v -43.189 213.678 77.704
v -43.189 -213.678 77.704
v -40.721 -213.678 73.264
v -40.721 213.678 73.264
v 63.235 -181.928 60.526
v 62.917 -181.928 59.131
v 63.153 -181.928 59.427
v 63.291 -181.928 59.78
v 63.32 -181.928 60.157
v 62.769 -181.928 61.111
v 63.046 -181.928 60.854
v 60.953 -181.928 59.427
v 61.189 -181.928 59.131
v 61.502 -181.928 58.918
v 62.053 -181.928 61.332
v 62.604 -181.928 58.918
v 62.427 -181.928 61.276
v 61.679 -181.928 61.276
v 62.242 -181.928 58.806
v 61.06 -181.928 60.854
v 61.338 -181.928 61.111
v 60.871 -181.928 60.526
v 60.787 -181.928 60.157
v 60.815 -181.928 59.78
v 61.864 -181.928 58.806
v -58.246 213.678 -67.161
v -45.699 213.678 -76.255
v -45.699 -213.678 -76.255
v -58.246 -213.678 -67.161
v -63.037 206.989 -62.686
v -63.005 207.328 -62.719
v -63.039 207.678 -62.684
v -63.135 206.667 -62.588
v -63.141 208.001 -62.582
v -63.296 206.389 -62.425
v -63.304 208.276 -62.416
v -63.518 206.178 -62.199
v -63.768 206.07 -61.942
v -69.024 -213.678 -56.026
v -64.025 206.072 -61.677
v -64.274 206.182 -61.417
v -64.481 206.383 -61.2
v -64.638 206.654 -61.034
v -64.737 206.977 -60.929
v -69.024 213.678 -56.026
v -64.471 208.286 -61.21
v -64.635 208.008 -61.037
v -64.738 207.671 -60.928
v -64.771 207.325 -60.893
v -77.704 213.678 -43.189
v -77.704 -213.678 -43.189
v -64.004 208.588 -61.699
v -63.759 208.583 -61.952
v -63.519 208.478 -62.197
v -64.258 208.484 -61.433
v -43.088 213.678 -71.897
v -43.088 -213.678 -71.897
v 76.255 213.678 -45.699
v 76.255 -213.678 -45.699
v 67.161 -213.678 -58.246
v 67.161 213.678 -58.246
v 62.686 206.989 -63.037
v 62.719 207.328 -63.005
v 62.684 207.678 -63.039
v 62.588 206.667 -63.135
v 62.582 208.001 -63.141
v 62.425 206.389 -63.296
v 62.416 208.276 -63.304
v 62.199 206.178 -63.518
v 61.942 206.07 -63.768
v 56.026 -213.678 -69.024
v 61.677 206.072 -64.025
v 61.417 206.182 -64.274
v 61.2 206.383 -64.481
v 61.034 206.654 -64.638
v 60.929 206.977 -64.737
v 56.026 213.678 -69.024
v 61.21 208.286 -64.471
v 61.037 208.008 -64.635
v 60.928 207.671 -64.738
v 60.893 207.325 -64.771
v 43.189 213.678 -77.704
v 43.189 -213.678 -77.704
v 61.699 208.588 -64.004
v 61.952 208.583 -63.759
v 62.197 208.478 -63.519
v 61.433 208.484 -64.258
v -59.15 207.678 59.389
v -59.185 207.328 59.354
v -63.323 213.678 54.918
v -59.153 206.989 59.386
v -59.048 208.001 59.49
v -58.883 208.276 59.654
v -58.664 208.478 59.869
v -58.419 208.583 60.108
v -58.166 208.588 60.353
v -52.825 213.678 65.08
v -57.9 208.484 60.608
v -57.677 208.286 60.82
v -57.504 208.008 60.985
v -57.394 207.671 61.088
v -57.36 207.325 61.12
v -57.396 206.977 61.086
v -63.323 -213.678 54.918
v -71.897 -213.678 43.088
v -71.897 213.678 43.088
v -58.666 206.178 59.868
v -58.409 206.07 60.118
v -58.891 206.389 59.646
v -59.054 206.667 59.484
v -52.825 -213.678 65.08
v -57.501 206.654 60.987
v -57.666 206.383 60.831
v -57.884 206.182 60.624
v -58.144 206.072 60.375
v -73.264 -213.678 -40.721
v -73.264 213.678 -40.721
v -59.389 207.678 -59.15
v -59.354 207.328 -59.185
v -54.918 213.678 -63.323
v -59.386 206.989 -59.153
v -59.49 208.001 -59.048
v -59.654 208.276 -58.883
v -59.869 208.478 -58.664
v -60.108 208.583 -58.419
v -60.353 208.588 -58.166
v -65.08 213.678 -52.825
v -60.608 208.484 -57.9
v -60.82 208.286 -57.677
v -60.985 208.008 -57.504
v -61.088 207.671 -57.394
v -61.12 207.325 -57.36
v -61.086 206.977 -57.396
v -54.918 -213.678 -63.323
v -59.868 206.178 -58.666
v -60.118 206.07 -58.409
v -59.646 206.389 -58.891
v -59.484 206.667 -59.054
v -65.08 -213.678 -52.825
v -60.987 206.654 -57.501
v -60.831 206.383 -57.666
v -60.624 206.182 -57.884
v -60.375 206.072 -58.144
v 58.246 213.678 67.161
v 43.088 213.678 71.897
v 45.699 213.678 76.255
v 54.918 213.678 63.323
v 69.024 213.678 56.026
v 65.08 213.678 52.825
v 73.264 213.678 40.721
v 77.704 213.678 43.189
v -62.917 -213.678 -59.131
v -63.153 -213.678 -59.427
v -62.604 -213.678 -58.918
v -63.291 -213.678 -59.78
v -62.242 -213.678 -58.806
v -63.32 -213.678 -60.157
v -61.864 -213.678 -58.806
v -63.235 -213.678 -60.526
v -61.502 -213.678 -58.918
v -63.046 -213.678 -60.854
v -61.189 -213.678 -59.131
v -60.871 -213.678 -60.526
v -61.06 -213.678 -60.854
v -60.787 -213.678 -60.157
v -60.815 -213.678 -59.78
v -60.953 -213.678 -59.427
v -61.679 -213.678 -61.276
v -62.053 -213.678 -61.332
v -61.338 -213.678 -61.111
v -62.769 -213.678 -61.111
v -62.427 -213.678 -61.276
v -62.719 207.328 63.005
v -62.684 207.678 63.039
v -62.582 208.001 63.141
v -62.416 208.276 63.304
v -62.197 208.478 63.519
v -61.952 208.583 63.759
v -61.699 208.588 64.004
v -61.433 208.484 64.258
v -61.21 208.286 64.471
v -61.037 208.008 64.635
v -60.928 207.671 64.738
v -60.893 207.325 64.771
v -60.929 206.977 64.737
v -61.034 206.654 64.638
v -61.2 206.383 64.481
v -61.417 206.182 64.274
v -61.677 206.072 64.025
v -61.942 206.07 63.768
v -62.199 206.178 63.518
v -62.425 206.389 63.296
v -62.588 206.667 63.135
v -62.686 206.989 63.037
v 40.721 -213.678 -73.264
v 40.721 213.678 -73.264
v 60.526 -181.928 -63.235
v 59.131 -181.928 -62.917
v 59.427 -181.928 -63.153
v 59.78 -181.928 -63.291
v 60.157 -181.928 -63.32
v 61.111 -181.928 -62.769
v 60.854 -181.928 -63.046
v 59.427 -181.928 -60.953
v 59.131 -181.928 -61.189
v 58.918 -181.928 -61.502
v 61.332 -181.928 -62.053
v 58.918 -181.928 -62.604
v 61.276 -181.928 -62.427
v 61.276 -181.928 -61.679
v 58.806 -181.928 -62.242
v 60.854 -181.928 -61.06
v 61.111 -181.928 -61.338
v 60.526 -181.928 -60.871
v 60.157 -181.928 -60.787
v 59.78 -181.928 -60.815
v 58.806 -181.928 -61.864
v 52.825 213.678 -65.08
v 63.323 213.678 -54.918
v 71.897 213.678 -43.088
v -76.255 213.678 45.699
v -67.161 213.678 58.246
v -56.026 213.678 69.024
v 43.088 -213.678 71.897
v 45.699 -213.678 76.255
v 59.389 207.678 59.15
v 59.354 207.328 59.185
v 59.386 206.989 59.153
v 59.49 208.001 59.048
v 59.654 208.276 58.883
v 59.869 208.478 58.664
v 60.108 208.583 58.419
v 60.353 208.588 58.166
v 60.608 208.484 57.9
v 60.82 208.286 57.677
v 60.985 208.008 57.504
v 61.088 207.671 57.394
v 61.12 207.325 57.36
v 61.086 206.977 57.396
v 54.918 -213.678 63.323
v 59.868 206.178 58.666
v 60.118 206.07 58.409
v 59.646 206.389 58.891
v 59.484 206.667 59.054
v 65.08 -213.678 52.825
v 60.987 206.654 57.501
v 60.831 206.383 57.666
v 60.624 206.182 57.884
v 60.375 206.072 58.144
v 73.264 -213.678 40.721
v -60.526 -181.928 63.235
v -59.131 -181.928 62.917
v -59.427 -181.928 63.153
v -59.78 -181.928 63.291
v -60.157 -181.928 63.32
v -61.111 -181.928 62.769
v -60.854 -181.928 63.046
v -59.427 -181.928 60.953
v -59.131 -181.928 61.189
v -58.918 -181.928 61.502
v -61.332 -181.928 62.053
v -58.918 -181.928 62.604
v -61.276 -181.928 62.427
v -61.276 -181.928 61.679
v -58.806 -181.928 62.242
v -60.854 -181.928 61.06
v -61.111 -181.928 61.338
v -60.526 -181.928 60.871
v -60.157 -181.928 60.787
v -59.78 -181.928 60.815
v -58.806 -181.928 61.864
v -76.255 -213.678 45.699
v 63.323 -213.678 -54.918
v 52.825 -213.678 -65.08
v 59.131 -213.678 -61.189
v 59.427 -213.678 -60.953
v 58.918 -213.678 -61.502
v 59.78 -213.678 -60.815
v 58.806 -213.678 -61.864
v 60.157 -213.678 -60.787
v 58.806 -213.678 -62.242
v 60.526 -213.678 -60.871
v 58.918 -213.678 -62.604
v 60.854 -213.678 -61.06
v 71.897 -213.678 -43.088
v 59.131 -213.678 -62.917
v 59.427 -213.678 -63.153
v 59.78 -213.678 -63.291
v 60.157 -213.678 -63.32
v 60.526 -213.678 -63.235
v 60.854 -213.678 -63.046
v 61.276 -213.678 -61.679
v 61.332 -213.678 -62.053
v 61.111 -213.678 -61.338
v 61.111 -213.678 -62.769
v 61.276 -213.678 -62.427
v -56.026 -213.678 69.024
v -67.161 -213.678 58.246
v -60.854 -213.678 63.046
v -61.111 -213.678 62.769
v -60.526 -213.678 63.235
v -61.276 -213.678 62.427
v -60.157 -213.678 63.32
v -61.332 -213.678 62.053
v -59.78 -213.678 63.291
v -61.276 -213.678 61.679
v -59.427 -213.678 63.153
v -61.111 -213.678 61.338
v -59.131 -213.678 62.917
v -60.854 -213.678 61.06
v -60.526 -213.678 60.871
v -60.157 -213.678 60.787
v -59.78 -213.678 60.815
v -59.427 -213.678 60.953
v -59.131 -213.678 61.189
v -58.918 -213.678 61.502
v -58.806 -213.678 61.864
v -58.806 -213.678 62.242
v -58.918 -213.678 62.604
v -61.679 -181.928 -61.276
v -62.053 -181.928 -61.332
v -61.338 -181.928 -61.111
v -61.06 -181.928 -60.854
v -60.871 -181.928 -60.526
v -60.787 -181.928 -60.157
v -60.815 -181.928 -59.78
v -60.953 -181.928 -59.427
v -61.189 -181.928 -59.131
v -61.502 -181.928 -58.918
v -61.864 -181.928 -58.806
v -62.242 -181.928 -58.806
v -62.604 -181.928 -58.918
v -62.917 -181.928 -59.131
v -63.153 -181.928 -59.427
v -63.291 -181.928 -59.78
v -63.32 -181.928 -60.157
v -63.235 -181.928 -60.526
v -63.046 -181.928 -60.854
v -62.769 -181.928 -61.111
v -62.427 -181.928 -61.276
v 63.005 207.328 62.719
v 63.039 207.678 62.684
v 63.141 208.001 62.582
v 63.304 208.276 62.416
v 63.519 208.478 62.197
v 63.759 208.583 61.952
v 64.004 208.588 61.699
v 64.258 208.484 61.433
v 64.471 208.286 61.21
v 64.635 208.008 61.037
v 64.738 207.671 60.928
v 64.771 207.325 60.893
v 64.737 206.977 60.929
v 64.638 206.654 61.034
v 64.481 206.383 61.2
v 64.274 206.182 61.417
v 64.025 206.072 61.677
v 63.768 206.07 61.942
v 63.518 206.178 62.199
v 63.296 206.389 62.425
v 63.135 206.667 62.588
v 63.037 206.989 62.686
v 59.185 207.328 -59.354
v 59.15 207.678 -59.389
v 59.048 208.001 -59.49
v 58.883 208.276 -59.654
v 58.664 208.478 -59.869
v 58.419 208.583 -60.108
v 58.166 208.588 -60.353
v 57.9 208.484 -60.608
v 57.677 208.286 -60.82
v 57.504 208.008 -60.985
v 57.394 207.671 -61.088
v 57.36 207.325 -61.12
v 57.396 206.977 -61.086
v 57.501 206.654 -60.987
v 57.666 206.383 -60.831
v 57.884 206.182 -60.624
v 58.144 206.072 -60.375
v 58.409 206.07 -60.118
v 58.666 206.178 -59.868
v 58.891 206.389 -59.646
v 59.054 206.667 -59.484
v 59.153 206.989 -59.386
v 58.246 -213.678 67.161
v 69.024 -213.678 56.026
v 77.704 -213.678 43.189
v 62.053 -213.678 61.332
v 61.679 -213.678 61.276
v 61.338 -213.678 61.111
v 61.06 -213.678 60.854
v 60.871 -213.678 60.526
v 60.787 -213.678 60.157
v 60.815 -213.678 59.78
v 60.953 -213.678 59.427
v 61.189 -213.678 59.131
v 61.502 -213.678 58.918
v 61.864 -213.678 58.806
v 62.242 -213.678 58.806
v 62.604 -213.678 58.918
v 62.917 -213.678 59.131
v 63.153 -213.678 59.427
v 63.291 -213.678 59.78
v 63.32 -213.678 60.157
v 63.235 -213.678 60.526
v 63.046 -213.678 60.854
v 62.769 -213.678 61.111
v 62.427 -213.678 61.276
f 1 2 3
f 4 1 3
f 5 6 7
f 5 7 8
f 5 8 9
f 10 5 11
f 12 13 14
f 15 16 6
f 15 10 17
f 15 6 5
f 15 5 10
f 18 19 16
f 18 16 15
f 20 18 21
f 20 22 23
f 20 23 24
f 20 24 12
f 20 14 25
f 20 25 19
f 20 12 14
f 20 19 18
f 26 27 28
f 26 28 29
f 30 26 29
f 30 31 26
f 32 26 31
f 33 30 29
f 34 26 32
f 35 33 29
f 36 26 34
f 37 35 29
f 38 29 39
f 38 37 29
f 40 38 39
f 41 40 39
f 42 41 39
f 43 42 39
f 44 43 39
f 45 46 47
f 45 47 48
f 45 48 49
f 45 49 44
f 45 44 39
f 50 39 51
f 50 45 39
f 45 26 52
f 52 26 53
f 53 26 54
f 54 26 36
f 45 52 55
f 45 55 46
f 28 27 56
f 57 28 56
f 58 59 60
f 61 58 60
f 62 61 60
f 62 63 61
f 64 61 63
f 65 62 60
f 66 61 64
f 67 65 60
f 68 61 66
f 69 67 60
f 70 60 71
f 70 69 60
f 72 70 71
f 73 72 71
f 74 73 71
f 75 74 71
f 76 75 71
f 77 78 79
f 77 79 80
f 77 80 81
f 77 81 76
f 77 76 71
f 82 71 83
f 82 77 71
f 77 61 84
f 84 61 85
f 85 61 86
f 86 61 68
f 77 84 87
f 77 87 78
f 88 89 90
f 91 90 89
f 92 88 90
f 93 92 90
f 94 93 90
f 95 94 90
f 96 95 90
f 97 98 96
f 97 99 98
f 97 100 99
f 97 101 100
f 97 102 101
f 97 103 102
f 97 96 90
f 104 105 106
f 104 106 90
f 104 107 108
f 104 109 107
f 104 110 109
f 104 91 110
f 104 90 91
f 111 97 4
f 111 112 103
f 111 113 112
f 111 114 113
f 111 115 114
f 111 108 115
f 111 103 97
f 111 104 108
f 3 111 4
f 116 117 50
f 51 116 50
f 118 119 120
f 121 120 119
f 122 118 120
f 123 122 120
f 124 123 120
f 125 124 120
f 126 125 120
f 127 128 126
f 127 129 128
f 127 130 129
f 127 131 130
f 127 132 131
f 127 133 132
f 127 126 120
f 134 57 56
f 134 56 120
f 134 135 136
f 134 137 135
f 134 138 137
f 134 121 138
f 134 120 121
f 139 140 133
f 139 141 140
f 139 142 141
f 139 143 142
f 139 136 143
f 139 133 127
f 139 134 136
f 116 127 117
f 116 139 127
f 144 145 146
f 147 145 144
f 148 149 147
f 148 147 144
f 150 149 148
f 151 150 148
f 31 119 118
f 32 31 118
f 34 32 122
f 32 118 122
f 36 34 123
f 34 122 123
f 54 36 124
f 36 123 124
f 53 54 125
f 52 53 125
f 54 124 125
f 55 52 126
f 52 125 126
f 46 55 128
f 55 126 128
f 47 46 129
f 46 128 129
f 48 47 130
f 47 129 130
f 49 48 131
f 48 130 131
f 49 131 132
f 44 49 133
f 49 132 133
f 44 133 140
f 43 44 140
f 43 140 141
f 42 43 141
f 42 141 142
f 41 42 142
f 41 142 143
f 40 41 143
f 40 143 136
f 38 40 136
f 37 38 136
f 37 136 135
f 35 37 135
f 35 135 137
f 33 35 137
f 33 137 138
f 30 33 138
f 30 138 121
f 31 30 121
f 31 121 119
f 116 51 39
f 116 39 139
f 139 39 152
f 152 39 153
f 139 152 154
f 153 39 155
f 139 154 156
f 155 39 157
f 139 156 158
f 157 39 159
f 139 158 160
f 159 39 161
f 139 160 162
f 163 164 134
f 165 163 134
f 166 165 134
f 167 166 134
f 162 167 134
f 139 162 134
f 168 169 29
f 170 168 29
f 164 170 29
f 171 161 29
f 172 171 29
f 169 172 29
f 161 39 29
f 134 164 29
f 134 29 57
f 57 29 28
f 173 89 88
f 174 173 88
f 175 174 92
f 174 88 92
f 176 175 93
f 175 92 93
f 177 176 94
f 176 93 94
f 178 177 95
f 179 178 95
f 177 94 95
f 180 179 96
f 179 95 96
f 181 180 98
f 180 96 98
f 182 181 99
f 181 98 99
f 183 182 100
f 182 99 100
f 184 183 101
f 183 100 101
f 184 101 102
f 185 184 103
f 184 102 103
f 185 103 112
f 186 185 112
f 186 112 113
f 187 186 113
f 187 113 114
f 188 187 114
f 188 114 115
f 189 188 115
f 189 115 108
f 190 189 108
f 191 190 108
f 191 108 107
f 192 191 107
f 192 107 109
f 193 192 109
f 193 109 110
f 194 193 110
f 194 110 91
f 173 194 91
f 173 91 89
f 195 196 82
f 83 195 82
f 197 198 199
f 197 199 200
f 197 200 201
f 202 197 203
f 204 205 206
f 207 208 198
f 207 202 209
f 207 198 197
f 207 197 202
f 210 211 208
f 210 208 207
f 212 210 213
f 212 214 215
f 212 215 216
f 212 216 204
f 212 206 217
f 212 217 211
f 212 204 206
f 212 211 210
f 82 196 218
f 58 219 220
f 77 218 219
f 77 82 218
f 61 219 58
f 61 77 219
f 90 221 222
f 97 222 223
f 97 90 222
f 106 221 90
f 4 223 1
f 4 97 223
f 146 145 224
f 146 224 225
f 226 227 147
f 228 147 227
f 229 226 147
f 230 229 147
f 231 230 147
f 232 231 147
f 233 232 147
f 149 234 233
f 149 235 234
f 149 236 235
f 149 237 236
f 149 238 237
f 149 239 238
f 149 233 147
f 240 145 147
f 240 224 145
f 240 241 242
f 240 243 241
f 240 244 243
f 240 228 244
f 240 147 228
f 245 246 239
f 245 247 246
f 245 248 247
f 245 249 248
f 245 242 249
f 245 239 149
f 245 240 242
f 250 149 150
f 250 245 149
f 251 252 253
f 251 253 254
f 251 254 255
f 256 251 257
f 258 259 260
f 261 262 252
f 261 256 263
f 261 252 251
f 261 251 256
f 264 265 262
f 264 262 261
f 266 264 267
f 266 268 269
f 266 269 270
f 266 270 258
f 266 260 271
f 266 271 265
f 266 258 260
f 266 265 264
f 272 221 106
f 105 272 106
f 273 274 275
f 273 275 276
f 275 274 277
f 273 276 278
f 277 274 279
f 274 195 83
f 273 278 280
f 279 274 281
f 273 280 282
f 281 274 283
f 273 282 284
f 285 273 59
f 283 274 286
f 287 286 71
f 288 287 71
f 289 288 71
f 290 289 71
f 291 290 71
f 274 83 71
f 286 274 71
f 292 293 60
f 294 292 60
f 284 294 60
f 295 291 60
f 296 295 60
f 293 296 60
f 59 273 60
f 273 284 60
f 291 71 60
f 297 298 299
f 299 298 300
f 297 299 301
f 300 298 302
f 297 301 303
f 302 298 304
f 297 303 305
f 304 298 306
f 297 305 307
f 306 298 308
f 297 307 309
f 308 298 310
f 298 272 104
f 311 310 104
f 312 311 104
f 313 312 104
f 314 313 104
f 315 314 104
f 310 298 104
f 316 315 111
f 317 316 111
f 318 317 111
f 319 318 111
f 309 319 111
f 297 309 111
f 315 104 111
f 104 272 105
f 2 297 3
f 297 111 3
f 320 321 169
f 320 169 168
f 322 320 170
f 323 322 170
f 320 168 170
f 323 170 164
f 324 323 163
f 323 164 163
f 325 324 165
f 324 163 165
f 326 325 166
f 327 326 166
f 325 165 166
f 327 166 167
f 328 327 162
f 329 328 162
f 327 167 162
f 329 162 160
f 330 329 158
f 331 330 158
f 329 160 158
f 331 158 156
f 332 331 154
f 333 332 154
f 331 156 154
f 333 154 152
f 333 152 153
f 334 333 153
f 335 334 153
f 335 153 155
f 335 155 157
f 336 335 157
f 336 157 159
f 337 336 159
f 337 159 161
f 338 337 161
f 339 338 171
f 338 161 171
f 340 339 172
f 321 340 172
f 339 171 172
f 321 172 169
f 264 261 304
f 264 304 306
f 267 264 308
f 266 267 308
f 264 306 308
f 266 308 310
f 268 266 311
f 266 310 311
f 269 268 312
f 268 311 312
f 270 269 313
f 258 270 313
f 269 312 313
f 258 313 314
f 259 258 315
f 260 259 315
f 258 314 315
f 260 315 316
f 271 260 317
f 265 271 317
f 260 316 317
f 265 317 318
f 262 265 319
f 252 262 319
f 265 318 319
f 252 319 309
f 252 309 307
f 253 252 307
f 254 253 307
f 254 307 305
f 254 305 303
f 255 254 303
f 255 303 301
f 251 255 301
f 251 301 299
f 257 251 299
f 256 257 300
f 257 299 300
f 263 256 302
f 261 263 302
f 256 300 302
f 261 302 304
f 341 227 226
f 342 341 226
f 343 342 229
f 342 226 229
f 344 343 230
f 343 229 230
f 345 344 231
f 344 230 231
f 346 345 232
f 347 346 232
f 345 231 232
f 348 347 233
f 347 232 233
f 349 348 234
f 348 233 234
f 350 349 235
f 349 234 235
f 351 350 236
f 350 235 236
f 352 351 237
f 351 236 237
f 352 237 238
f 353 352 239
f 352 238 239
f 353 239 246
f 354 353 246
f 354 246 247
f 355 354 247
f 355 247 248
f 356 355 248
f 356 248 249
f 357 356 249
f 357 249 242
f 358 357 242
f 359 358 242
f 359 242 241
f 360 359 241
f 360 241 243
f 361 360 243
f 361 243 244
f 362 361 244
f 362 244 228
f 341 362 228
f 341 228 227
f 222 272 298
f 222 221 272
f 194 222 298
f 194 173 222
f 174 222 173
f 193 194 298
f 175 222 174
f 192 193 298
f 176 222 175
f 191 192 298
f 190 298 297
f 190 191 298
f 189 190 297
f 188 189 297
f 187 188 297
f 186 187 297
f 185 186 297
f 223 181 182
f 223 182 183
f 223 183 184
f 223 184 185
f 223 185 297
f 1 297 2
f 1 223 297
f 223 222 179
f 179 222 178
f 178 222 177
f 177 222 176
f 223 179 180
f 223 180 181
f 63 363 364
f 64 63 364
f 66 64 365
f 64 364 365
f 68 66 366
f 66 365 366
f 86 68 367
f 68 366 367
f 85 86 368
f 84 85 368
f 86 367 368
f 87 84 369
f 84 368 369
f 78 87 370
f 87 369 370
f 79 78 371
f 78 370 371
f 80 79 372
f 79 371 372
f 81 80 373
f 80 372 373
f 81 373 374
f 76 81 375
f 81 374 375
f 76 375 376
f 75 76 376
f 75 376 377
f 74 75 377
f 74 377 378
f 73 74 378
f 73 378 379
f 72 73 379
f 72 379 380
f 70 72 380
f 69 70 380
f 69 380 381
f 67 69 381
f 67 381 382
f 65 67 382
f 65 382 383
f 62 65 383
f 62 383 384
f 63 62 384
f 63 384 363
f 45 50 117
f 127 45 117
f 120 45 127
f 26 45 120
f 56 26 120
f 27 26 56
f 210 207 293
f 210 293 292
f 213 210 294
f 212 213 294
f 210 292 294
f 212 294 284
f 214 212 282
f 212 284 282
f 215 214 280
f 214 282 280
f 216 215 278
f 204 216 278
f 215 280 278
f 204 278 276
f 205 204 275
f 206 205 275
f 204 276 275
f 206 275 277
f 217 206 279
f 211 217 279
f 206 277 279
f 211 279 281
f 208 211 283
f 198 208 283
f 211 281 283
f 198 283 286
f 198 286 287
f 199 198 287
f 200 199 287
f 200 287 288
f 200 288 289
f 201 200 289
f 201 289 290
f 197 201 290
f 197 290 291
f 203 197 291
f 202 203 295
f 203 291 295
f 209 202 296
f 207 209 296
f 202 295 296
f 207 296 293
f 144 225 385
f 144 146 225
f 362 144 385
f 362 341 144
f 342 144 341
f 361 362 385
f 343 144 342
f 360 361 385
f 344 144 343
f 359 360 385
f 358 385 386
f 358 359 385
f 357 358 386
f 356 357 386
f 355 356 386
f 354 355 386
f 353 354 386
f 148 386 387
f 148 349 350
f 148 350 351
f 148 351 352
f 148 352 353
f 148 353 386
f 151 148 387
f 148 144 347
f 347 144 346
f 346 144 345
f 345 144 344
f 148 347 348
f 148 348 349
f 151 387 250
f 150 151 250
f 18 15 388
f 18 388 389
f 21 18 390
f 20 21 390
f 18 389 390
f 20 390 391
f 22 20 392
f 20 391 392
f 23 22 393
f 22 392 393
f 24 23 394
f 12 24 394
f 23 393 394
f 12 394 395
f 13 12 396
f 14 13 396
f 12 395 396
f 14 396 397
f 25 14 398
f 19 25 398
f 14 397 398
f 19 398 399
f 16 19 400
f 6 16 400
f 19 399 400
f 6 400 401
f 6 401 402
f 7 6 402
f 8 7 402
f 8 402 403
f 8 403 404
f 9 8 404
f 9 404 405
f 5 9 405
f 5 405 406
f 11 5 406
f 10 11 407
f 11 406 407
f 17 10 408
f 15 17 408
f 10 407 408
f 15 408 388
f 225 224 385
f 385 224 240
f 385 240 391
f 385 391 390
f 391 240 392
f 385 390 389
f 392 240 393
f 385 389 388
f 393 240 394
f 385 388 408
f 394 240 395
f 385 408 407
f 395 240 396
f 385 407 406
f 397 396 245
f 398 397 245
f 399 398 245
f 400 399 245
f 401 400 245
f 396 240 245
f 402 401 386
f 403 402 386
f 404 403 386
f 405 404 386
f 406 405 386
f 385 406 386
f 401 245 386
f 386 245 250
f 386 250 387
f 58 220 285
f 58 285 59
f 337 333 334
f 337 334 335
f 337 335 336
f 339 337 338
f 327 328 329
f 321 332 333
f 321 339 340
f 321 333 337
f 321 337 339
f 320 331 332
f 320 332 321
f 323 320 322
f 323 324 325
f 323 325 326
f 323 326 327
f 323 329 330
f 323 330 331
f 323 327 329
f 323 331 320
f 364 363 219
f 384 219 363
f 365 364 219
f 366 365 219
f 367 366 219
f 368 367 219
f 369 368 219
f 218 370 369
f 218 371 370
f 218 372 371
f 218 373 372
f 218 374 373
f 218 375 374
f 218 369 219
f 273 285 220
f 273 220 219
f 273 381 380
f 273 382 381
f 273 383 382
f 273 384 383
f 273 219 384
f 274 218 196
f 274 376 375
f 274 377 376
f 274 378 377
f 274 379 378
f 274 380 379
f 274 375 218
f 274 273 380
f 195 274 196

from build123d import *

# Parameters (mm, degrees)
SKETCH2_R               = 88.9
SKETCH2_R_2             = 83.82
BOSS_EXTRUDE1_DEPTH     = 213.6775
CUT_EXTRUDE1_DEPTH      = 214.6775
CUT_EXTRUDE1_DEPTH_BACK = 214.6775
SKETCH5_R               = 1.27
TOP_BOLT_HOLES_DEPTH    = 29.911624556
SKETCH6_R               = 1.27
BOTTOM_BOLT_HOLES_DEPTH = 31.75
BOLT_PATTERN_COUNT      = 4


with BuildPart() as part:
    # Sketch2 → Boss-Extrude1 (new body, symmetric)
    with BuildSketch(Plane(origin=(0, 0, 0), x_dir=(1, 0, 0), z_dir=(0, 1, 0))):
        Circle(SKETCH2_R)
        Circle(SKETCH2_R_2, mode=Mode.SUBTRACT)
    extrude(amount=BOSS_EXTRUDE1_DEPTH, both=True)

    # Sketch3 → Cut-Extrude1 (cut, two sides)
    with BuildSketch(Plane(origin=(0, 0, 0), x_dir=(1, 0, 0), z_dir=(0, 1, 0))) as cut_extrude1_sk:
        Polygon((169.661755759, -94.300371224), (0, 0), (169.661755759, 101.677593364), align=None)
        Polygon((0, 0), (53.900027233, 96.974944394), (-58.116685864, 96.974944394), align=None)
        Polygon((-123.741299607, 68.777140945), (-123.741299607, -74.157652604), (0, 0), align=None)
        Polygon((-65.840936026, -118.45858783), (0, 0), (70.991745134, -118.45858783), align=None)
    extrude(amount=CUT_EXTRUDE1_DEPTH, mode=Mode.SUBTRACT)
    extrude(cut_extrude1_sk.sketch, amount=-CUT_EXTRUDE1_DEPTH_BACK, mode=Mode.SUBTRACT)

    # Sketch5 → Top bolt holes (cut, through all)
    with BuildSketch(Plane(origin=(-56.309218645, 0, 58.175814955), x_dir=(-0.718540152, 0, -0.695485478), z_dir=(0.695485478, 0, -0.718540152))):
        with Locations((-0.02278764, 207.3275)):
            Circle(SKETCH5_R)
    top_bolt_holes = extrude(amount=-TOP_BOLT_HOLES_DEPTH, mode=Mode.SUBTRACT)

    # Sketch6 → Bottom bolt holes (cut)
    with BuildSketch(Plane(origin=(0, -213.6775, 0), x_dir=(-1, 0, 0), z_dir=(0, -1, 0))):
        with Locations((60.062125915, -62.053127484)):
            Circle(SKETCH6_R)
    bottom_bolt_holes = extrude(amount=-BOTTOM_BOLT_HOLES_DEPTH, mode=Mode.SUBTRACT)

    # Bolt pattern: Top bolt holes, Bottom bolt holes ×4 about axis
    bolt_pattern_axis = Axis((0, 0, 0), (0, 1, 0))
    for i in range(1, BOLT_PATTERN_COUNT):
        add(top_bolt_holes.rotate(bolt_pattern_axis, i * 360 / BOLT_PATTERN_COUNT), mode=Mode.SUBTRACT)
        add(bottom_bolt_holes.rotate(bolt_pattern_axis, i * 360 / BOLT_PATTERN_COUNT), mode=Mode.SUBTRACT)


solid = part.part
